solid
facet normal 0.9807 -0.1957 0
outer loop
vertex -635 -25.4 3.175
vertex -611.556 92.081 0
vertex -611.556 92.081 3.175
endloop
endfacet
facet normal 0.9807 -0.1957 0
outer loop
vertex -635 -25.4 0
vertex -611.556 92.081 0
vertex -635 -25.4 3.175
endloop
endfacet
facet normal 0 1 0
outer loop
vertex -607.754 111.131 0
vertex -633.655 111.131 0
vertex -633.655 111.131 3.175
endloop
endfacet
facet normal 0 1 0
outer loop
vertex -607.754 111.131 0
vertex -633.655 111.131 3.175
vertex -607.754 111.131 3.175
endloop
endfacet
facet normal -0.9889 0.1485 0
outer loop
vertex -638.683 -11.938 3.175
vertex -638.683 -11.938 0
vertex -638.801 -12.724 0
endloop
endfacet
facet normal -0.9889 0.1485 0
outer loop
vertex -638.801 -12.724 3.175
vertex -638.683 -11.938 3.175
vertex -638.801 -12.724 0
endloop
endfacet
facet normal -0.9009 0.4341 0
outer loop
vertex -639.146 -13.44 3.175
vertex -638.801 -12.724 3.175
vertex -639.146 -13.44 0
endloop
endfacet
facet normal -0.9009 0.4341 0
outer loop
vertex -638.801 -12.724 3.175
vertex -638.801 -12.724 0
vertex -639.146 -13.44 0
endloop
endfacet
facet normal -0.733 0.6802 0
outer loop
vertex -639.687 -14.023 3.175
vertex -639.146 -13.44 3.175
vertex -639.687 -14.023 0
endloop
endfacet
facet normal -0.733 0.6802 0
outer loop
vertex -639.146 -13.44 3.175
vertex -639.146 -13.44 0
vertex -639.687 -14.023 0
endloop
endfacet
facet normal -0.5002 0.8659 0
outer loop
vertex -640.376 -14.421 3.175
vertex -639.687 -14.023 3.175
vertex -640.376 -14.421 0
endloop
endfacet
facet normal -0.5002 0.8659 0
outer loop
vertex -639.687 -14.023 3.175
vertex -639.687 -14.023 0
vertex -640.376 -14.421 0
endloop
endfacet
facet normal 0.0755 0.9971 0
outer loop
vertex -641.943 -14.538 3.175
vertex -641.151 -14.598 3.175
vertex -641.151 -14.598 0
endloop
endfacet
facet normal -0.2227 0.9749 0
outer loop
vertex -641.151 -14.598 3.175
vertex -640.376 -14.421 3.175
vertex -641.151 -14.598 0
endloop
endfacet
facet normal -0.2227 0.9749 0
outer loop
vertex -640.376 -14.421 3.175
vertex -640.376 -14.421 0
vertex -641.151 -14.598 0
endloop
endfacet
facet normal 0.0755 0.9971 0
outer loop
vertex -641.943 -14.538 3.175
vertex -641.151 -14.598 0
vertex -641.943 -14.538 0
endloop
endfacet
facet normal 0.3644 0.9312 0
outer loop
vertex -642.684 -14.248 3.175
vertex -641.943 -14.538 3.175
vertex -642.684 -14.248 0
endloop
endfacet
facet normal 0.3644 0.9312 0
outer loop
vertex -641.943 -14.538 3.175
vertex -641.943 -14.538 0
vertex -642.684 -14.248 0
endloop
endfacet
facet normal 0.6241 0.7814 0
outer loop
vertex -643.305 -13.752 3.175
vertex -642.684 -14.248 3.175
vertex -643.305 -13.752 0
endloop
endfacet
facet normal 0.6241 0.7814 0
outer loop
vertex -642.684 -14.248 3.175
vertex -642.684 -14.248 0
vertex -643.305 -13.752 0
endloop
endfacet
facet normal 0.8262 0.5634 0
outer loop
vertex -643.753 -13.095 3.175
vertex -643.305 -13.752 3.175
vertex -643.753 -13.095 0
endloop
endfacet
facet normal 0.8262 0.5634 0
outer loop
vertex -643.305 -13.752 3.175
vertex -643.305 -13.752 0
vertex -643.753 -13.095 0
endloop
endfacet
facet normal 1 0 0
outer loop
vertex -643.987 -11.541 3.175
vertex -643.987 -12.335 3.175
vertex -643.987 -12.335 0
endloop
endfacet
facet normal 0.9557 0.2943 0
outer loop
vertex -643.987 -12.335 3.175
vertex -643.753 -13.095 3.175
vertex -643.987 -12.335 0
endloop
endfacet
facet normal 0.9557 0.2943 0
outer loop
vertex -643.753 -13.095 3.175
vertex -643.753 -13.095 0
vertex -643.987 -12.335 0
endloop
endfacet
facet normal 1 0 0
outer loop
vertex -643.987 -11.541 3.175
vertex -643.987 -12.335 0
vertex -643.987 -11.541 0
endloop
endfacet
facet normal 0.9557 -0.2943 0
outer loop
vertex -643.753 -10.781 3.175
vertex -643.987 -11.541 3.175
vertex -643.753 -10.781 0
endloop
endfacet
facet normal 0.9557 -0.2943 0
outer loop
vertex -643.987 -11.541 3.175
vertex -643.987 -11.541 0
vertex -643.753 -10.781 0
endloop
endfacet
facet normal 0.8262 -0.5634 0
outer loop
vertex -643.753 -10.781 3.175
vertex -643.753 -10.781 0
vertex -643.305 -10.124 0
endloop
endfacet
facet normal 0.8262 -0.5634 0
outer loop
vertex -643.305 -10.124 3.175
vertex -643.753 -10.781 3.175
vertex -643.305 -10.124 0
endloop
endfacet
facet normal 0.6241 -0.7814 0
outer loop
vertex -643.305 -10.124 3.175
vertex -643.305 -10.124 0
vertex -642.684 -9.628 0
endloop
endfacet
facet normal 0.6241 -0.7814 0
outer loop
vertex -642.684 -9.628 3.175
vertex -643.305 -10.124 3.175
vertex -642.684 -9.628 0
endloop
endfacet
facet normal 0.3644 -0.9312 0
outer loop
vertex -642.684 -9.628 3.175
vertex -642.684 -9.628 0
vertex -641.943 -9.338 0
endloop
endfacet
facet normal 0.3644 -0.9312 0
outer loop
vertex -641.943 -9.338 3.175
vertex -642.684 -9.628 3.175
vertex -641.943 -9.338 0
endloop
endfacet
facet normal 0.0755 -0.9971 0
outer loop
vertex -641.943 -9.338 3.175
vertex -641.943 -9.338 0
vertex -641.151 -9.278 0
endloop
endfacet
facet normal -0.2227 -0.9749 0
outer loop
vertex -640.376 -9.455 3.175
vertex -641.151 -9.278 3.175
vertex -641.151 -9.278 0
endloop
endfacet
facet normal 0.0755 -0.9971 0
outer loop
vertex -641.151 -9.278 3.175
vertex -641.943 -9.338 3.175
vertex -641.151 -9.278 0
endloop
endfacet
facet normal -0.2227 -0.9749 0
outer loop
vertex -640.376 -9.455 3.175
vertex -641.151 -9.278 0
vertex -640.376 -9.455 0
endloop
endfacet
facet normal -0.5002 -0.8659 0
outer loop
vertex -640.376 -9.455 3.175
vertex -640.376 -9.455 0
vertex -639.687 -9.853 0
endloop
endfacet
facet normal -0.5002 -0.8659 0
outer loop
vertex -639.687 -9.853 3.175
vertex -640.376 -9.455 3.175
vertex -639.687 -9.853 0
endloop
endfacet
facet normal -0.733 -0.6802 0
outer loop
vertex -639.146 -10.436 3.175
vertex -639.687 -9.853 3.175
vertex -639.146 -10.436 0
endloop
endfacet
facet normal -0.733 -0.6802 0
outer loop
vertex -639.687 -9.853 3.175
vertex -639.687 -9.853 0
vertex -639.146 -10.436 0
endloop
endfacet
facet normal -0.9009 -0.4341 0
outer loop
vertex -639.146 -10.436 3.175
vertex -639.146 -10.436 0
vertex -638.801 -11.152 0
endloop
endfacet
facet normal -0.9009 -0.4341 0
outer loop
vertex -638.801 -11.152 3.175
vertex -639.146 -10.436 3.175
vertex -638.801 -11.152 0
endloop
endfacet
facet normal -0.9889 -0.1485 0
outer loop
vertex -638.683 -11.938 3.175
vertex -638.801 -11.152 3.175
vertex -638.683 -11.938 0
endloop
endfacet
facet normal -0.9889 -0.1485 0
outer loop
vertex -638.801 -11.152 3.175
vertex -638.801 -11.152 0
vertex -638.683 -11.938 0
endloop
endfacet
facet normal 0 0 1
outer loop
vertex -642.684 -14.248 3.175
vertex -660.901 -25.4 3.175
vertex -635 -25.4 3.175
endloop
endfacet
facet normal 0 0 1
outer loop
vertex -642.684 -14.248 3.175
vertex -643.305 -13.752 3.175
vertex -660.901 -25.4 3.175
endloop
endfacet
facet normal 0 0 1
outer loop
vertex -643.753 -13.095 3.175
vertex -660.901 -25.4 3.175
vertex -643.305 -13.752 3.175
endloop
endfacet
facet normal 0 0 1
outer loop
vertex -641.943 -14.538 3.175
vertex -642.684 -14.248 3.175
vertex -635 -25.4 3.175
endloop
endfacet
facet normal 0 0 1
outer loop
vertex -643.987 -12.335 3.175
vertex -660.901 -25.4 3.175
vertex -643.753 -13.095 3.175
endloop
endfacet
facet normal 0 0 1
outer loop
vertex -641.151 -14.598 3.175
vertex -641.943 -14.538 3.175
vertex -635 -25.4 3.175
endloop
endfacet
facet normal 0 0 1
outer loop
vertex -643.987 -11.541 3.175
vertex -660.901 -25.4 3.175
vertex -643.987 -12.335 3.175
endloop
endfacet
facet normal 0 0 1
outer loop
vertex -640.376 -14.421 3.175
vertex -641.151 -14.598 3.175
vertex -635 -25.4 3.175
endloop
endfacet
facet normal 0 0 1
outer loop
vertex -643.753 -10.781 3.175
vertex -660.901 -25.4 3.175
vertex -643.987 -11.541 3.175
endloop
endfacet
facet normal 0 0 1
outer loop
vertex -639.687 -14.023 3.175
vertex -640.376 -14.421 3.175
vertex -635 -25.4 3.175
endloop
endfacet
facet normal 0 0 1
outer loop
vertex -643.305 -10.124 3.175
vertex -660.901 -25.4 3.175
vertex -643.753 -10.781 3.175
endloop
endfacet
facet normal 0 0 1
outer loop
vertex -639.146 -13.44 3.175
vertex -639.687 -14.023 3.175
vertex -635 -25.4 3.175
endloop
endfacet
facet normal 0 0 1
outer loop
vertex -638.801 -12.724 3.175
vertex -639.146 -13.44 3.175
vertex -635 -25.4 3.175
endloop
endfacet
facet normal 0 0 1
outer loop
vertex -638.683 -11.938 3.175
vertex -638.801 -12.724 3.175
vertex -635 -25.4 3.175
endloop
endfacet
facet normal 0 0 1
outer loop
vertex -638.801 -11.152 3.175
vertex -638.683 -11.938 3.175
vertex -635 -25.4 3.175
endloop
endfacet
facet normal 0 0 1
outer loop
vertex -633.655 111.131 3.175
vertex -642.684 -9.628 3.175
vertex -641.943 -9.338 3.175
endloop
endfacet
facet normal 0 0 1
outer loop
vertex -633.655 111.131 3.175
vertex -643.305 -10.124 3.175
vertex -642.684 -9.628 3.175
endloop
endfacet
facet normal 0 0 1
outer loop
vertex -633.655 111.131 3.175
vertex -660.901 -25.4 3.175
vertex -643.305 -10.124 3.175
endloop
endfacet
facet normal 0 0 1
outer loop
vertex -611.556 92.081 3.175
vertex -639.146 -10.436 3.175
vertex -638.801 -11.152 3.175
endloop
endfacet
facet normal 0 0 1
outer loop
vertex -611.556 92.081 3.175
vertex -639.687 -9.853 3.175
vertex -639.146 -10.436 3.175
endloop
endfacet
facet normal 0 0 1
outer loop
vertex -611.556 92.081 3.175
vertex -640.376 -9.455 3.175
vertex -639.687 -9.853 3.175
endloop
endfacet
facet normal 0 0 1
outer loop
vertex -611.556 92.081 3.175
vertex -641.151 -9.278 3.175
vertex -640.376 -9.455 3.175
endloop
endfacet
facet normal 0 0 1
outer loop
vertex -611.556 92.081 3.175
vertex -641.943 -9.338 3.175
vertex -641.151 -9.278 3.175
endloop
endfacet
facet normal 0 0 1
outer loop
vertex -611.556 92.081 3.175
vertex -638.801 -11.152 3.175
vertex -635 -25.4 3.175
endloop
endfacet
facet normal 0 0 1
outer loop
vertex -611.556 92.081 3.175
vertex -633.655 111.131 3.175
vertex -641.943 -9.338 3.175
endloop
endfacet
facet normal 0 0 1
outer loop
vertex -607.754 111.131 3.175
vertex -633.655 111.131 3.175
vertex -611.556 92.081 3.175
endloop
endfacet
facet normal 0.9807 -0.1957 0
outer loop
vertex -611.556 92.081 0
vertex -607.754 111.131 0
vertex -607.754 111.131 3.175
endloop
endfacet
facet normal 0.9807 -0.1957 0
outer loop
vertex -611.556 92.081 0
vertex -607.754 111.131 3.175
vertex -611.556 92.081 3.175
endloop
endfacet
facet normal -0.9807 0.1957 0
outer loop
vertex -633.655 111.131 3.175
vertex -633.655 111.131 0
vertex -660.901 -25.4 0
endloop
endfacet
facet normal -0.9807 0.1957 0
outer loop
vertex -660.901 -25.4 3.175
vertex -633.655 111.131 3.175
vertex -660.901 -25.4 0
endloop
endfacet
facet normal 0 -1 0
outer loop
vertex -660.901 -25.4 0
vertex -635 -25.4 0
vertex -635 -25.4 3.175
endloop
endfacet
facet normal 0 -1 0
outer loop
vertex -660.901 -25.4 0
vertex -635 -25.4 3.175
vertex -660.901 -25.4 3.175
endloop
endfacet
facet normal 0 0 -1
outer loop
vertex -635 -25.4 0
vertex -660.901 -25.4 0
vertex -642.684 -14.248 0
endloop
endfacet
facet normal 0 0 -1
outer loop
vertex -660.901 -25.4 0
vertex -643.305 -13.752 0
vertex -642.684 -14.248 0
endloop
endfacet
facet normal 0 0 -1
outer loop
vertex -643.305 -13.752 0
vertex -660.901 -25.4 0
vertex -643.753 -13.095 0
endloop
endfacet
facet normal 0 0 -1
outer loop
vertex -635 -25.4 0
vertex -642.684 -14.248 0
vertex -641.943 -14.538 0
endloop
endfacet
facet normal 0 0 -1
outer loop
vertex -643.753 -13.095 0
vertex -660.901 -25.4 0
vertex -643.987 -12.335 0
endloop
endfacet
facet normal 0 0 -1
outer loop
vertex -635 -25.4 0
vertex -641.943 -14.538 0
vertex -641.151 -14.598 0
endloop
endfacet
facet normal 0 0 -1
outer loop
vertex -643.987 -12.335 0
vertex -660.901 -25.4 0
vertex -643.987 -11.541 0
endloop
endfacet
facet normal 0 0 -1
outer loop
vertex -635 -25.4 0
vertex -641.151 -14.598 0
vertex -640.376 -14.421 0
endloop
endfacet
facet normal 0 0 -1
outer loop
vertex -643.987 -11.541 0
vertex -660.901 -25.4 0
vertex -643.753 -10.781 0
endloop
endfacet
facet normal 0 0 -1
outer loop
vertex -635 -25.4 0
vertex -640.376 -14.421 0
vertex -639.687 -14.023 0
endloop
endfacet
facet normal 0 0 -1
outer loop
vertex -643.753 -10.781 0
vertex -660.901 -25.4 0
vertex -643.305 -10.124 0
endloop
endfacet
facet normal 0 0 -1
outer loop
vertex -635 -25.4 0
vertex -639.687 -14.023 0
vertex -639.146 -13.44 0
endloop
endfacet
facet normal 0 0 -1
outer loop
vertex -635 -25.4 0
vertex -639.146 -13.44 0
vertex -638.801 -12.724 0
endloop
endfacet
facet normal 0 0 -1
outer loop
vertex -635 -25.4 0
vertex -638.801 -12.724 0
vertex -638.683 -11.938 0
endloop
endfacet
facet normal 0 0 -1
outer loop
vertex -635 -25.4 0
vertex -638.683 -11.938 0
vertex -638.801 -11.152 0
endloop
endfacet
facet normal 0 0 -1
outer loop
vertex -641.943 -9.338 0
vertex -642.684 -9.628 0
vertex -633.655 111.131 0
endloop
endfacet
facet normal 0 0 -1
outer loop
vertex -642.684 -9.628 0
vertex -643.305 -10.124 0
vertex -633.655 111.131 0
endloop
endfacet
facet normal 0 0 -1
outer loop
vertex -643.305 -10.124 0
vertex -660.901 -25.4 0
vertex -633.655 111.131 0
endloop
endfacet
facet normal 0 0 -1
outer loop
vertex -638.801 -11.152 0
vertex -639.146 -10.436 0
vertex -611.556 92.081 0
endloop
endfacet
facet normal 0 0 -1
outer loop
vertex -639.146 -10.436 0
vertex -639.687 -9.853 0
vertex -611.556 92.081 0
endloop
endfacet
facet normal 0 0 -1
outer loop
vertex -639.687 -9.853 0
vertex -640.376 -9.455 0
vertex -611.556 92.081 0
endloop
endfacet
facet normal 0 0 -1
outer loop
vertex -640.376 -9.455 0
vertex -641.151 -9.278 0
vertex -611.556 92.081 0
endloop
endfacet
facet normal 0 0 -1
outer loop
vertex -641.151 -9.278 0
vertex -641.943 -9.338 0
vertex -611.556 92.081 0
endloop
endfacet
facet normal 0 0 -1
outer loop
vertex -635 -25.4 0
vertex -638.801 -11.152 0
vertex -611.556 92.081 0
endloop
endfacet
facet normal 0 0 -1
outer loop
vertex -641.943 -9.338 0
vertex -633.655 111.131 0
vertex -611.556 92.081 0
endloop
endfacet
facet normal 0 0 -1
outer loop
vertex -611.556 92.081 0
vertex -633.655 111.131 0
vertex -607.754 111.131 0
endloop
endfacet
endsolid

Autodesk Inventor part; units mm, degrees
ref_plane "YZ Plane" through (0, 0, 0) normal (1, 0, 0) x (0, 1, 0)
ref_plane "XZ Plane" through (0, 0, 0) normal (0, 1, 0) x (-1, 0, 0)
ref_plane "XY Plane" through (0, 0, 0) normal (0, 0, 1) x (1, 0, 0)
sketch "Sketch1" plane through (0, 0, 0) normal (0, 0, 1) x (1, 0, 0)
  circle A0 centre (-641.35, -11.938) radius 2.667 projected
  line L0 (-635, -25.4) -> (-787.4, -25.4) projected
  line L1 (-611.5558, 111.1309) -> (-611.5558, 92.0809) projected
  line L2 (-611.5558, 88.9059) -> (-611.5558, 92.0809) projected
  line L3 (-655.7192, 0) -> (-787.4, 0)
  line L4 (-611.5558, 92.0809) -> (-635, -25.4)
  line L5 (-633.655, 111.1309) -> (-660.9008, -25.4)
  line L6 (-655.8321, 0) -> (-787.4, 0)
  line L7 (-633.655, 111.1309) -> (-607.7542, 111.1309)
  line L8 (-607.7542, 111.1309) -> (-611.5558, 92.0809)
  line L9 (-660.9008, -25.4) -> (-635, -25.4)
  point P0 (0, 0)
  dimension "d1" = 25.4
extrude "Extrusion1" add sketch "Sketch1" along normal blind 3.175
properties part number "2018 Cube Backstop Mount Angle"
